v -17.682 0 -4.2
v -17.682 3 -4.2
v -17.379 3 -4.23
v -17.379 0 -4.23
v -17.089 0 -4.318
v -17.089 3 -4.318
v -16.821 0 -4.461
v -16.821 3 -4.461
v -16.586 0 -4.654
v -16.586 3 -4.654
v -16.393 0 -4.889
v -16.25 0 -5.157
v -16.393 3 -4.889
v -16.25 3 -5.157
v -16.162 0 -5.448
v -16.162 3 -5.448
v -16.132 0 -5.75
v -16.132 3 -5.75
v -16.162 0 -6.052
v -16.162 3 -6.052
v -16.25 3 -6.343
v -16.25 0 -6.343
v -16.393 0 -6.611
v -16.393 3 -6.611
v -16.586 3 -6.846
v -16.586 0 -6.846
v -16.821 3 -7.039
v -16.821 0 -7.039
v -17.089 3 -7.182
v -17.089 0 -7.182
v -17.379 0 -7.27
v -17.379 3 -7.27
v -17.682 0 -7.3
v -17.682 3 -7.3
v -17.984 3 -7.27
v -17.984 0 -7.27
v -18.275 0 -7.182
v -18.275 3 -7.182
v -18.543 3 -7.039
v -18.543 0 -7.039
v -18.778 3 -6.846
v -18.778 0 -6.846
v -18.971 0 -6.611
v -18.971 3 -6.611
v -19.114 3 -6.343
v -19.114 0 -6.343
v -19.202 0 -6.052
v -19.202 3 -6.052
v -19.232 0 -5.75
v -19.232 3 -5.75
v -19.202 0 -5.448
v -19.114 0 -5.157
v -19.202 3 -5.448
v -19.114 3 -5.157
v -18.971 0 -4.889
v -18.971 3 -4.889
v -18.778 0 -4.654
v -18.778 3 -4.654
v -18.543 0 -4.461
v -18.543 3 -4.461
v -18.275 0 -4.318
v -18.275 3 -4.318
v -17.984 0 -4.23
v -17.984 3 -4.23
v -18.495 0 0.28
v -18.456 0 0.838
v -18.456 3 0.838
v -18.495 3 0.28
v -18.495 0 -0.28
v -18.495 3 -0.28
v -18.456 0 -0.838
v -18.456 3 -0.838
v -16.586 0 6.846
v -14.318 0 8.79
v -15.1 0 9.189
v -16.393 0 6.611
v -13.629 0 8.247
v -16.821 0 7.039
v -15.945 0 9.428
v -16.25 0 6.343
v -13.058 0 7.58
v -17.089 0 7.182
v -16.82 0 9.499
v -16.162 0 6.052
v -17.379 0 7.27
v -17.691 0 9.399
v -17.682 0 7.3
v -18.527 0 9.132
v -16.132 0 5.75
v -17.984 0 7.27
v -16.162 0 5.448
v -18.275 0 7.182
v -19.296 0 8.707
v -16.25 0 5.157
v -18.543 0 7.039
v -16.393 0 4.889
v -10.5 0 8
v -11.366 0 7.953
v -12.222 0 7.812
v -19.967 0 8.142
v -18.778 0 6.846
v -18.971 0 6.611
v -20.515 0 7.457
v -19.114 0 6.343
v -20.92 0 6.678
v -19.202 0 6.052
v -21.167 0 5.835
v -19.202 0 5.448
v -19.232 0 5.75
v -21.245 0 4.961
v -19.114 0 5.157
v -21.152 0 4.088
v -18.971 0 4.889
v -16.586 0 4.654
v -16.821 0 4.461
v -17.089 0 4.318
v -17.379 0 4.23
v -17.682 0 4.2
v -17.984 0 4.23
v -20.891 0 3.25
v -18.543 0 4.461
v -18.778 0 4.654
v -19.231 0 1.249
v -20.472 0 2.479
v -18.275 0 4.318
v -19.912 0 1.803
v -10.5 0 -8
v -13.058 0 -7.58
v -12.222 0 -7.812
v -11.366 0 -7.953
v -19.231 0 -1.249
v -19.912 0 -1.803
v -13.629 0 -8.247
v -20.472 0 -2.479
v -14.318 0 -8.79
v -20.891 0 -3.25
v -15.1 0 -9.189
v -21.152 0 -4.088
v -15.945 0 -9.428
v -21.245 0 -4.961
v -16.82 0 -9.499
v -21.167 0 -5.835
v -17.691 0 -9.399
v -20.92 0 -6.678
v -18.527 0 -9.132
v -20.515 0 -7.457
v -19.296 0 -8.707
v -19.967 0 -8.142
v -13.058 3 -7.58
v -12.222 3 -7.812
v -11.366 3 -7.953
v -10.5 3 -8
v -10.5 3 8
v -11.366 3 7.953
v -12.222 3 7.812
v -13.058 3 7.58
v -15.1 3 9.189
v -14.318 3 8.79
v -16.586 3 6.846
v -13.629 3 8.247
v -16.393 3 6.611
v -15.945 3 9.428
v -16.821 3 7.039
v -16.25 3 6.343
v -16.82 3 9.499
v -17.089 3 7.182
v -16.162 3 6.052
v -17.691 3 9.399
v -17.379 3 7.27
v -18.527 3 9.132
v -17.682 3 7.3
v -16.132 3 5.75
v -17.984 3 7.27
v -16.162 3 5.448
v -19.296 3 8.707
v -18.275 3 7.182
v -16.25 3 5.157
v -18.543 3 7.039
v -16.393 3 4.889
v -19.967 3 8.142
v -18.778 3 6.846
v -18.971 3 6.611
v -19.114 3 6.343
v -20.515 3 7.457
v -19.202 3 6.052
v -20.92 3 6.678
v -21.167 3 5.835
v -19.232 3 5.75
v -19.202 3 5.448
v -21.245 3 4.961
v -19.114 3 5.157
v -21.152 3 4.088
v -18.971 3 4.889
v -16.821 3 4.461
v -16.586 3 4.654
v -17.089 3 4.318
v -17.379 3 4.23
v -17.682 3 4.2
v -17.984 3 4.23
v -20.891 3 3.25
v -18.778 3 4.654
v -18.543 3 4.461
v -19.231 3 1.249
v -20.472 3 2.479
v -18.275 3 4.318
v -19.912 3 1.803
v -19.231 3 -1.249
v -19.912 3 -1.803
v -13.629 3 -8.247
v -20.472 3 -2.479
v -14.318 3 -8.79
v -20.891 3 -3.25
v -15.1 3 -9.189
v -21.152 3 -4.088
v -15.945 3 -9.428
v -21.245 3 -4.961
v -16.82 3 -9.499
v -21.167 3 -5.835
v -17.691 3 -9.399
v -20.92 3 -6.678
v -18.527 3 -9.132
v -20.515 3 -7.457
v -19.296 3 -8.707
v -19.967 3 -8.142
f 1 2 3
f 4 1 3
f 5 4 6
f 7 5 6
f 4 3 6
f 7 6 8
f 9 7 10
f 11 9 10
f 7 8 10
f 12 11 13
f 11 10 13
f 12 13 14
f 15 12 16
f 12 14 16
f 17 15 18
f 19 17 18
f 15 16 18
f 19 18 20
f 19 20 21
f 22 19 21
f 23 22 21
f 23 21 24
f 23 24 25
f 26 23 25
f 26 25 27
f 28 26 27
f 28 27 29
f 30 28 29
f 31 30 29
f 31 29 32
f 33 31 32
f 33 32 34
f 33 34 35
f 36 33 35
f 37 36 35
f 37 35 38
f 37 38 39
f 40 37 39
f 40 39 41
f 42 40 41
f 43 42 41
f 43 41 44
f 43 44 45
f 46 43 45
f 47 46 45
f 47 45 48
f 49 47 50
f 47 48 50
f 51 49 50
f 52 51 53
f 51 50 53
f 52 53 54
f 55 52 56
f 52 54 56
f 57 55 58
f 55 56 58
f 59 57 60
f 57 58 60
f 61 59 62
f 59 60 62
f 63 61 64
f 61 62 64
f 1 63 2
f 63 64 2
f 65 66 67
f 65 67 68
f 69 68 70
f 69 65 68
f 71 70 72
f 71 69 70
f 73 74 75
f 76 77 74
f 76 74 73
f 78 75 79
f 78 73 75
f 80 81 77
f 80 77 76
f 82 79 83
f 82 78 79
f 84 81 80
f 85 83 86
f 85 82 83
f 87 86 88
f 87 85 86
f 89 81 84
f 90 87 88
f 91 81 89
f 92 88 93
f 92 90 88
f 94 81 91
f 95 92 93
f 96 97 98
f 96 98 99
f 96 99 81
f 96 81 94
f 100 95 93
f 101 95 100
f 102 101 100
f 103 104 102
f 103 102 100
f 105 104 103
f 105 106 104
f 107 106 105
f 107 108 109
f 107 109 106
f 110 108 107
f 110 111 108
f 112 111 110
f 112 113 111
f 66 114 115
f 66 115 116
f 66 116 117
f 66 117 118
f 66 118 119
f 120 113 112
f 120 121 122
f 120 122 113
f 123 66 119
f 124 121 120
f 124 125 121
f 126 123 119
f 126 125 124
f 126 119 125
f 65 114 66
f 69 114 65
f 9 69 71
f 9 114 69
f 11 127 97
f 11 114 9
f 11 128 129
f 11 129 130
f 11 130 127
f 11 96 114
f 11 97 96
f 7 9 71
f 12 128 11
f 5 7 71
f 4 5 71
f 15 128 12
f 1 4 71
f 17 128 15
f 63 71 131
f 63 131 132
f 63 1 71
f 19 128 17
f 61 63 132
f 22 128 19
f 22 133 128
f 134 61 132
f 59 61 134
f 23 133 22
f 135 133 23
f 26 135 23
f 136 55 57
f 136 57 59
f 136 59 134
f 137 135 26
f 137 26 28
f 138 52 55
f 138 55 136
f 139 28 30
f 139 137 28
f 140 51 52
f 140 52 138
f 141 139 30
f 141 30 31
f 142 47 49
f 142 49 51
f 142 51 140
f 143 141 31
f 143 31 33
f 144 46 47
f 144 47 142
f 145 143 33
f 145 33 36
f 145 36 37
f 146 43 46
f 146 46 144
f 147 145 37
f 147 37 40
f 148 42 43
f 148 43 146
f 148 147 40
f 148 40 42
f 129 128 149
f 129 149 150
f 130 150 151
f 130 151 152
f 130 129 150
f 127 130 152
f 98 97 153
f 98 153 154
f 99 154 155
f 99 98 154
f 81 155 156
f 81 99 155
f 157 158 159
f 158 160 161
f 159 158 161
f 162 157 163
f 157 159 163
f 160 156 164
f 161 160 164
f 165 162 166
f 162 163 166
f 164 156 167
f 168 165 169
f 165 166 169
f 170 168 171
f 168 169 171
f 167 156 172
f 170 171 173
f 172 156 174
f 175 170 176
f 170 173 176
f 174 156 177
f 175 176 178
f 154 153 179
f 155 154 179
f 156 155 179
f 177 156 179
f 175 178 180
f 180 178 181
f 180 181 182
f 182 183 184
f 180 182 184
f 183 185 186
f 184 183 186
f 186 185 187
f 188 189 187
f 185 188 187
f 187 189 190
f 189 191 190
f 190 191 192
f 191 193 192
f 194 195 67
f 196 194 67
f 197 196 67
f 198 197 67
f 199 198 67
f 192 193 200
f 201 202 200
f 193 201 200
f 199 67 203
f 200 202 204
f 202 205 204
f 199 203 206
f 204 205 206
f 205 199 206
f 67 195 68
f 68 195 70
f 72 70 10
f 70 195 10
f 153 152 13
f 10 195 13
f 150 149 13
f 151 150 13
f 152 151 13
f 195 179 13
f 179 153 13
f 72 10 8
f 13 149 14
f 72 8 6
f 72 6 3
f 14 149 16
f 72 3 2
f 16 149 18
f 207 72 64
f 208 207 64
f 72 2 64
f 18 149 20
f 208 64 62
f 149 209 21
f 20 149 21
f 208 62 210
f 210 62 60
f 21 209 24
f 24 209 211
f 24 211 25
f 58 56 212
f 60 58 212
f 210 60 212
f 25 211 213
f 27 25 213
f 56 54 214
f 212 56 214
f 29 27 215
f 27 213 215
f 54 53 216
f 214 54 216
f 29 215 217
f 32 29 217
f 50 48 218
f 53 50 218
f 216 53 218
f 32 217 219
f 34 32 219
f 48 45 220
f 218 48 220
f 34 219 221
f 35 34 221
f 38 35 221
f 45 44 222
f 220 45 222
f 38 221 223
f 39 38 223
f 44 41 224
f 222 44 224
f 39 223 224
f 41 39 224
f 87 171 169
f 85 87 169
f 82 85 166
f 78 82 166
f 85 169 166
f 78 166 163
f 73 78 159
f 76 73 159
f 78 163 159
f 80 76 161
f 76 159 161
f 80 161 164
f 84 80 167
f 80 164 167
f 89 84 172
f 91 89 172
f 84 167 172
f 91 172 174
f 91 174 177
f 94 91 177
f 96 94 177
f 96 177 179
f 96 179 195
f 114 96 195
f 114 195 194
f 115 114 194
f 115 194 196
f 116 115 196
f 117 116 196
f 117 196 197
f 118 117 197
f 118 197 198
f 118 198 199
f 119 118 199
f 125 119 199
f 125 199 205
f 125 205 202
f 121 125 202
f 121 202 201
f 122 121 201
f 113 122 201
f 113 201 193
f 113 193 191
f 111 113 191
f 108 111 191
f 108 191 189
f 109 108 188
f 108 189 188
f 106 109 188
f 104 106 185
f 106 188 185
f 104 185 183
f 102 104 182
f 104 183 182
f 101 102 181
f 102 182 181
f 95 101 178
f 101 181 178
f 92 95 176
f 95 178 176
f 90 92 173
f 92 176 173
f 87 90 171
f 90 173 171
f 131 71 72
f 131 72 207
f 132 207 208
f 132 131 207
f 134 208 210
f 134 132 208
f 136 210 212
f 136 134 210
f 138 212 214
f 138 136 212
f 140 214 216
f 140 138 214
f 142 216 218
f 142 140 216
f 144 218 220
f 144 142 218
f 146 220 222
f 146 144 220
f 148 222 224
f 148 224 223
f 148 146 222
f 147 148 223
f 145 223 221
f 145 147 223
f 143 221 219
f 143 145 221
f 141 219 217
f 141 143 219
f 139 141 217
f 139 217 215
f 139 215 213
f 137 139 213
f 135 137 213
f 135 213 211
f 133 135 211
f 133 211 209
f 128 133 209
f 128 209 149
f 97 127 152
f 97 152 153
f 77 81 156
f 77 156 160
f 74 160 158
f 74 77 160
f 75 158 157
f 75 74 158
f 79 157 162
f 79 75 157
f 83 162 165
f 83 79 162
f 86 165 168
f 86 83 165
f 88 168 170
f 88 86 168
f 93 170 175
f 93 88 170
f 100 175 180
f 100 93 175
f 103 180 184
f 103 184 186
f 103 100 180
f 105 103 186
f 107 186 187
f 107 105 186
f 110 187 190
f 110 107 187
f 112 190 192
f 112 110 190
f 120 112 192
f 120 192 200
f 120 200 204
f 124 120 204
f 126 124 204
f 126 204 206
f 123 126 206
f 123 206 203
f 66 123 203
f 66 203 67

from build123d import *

# Parameters (mm, degrees)
EXTRUDE_1_DEPTH     = 3
SKETCH_2_R          = 1.55
CUT_EXTRUDE_1_DEPTH = 24.464866076


with BuildPart() as part:
    # 草图1 → 凸台-拉伸1 (new body)
    with BuildSketch(Plane(origin=(0, 0, 0), x_dir=(1, 0, 0), z_dir=(0, 1, 0))):
        with BuildLine():
            Line((-10.5, 8), (-10.5, -8))
            ThreePointArc((-10.5, -8), (-11.796148944, -7.89430161), (-13.058047675, -7.579999479))
            ThreePointArc((-13.058047675, -7.579999479), (-20.257809372, -7.8125), (-18.455991924, -0.837969271))
            ThreePointArc((-18.455991924, -0.837969271), (-18.5, 0), (-18.455991924, 0.837969271))
            ThreePointArc((-18.455991924, 0.837969271), (-20.257809372, 7.8125), (-13.058047675, 7.579999479))
            ThreePointArc((-13.058047675, 7.579999479), (-11.796148944, 7.89430161), (-10.5, 8))
        make_face()
    extrude(amount=EXTRUDE_1_DEPTH)

    # 草图2 → 切除-拉伸1 (cut, through all)
    with BuildSketch(Plane(origin=(0, 3, 0), x_dir=(1, 0, 0), z_dir=(0, 1, 0))):
        with Locations(Location((-17.681747698, 5.75, 0), (0, 0, 270))):
            Circle(SKETCH_2_R)
        with Locations(Location((-17.681747698, -5.75, 0), (0, 0, 270))):
            Circle(SKETCH_2_R)
    extrude(amount=-CUT_EXTRUDE_1_DEPTH, mode=Mode.SUBTRACT)


solid = part.part
